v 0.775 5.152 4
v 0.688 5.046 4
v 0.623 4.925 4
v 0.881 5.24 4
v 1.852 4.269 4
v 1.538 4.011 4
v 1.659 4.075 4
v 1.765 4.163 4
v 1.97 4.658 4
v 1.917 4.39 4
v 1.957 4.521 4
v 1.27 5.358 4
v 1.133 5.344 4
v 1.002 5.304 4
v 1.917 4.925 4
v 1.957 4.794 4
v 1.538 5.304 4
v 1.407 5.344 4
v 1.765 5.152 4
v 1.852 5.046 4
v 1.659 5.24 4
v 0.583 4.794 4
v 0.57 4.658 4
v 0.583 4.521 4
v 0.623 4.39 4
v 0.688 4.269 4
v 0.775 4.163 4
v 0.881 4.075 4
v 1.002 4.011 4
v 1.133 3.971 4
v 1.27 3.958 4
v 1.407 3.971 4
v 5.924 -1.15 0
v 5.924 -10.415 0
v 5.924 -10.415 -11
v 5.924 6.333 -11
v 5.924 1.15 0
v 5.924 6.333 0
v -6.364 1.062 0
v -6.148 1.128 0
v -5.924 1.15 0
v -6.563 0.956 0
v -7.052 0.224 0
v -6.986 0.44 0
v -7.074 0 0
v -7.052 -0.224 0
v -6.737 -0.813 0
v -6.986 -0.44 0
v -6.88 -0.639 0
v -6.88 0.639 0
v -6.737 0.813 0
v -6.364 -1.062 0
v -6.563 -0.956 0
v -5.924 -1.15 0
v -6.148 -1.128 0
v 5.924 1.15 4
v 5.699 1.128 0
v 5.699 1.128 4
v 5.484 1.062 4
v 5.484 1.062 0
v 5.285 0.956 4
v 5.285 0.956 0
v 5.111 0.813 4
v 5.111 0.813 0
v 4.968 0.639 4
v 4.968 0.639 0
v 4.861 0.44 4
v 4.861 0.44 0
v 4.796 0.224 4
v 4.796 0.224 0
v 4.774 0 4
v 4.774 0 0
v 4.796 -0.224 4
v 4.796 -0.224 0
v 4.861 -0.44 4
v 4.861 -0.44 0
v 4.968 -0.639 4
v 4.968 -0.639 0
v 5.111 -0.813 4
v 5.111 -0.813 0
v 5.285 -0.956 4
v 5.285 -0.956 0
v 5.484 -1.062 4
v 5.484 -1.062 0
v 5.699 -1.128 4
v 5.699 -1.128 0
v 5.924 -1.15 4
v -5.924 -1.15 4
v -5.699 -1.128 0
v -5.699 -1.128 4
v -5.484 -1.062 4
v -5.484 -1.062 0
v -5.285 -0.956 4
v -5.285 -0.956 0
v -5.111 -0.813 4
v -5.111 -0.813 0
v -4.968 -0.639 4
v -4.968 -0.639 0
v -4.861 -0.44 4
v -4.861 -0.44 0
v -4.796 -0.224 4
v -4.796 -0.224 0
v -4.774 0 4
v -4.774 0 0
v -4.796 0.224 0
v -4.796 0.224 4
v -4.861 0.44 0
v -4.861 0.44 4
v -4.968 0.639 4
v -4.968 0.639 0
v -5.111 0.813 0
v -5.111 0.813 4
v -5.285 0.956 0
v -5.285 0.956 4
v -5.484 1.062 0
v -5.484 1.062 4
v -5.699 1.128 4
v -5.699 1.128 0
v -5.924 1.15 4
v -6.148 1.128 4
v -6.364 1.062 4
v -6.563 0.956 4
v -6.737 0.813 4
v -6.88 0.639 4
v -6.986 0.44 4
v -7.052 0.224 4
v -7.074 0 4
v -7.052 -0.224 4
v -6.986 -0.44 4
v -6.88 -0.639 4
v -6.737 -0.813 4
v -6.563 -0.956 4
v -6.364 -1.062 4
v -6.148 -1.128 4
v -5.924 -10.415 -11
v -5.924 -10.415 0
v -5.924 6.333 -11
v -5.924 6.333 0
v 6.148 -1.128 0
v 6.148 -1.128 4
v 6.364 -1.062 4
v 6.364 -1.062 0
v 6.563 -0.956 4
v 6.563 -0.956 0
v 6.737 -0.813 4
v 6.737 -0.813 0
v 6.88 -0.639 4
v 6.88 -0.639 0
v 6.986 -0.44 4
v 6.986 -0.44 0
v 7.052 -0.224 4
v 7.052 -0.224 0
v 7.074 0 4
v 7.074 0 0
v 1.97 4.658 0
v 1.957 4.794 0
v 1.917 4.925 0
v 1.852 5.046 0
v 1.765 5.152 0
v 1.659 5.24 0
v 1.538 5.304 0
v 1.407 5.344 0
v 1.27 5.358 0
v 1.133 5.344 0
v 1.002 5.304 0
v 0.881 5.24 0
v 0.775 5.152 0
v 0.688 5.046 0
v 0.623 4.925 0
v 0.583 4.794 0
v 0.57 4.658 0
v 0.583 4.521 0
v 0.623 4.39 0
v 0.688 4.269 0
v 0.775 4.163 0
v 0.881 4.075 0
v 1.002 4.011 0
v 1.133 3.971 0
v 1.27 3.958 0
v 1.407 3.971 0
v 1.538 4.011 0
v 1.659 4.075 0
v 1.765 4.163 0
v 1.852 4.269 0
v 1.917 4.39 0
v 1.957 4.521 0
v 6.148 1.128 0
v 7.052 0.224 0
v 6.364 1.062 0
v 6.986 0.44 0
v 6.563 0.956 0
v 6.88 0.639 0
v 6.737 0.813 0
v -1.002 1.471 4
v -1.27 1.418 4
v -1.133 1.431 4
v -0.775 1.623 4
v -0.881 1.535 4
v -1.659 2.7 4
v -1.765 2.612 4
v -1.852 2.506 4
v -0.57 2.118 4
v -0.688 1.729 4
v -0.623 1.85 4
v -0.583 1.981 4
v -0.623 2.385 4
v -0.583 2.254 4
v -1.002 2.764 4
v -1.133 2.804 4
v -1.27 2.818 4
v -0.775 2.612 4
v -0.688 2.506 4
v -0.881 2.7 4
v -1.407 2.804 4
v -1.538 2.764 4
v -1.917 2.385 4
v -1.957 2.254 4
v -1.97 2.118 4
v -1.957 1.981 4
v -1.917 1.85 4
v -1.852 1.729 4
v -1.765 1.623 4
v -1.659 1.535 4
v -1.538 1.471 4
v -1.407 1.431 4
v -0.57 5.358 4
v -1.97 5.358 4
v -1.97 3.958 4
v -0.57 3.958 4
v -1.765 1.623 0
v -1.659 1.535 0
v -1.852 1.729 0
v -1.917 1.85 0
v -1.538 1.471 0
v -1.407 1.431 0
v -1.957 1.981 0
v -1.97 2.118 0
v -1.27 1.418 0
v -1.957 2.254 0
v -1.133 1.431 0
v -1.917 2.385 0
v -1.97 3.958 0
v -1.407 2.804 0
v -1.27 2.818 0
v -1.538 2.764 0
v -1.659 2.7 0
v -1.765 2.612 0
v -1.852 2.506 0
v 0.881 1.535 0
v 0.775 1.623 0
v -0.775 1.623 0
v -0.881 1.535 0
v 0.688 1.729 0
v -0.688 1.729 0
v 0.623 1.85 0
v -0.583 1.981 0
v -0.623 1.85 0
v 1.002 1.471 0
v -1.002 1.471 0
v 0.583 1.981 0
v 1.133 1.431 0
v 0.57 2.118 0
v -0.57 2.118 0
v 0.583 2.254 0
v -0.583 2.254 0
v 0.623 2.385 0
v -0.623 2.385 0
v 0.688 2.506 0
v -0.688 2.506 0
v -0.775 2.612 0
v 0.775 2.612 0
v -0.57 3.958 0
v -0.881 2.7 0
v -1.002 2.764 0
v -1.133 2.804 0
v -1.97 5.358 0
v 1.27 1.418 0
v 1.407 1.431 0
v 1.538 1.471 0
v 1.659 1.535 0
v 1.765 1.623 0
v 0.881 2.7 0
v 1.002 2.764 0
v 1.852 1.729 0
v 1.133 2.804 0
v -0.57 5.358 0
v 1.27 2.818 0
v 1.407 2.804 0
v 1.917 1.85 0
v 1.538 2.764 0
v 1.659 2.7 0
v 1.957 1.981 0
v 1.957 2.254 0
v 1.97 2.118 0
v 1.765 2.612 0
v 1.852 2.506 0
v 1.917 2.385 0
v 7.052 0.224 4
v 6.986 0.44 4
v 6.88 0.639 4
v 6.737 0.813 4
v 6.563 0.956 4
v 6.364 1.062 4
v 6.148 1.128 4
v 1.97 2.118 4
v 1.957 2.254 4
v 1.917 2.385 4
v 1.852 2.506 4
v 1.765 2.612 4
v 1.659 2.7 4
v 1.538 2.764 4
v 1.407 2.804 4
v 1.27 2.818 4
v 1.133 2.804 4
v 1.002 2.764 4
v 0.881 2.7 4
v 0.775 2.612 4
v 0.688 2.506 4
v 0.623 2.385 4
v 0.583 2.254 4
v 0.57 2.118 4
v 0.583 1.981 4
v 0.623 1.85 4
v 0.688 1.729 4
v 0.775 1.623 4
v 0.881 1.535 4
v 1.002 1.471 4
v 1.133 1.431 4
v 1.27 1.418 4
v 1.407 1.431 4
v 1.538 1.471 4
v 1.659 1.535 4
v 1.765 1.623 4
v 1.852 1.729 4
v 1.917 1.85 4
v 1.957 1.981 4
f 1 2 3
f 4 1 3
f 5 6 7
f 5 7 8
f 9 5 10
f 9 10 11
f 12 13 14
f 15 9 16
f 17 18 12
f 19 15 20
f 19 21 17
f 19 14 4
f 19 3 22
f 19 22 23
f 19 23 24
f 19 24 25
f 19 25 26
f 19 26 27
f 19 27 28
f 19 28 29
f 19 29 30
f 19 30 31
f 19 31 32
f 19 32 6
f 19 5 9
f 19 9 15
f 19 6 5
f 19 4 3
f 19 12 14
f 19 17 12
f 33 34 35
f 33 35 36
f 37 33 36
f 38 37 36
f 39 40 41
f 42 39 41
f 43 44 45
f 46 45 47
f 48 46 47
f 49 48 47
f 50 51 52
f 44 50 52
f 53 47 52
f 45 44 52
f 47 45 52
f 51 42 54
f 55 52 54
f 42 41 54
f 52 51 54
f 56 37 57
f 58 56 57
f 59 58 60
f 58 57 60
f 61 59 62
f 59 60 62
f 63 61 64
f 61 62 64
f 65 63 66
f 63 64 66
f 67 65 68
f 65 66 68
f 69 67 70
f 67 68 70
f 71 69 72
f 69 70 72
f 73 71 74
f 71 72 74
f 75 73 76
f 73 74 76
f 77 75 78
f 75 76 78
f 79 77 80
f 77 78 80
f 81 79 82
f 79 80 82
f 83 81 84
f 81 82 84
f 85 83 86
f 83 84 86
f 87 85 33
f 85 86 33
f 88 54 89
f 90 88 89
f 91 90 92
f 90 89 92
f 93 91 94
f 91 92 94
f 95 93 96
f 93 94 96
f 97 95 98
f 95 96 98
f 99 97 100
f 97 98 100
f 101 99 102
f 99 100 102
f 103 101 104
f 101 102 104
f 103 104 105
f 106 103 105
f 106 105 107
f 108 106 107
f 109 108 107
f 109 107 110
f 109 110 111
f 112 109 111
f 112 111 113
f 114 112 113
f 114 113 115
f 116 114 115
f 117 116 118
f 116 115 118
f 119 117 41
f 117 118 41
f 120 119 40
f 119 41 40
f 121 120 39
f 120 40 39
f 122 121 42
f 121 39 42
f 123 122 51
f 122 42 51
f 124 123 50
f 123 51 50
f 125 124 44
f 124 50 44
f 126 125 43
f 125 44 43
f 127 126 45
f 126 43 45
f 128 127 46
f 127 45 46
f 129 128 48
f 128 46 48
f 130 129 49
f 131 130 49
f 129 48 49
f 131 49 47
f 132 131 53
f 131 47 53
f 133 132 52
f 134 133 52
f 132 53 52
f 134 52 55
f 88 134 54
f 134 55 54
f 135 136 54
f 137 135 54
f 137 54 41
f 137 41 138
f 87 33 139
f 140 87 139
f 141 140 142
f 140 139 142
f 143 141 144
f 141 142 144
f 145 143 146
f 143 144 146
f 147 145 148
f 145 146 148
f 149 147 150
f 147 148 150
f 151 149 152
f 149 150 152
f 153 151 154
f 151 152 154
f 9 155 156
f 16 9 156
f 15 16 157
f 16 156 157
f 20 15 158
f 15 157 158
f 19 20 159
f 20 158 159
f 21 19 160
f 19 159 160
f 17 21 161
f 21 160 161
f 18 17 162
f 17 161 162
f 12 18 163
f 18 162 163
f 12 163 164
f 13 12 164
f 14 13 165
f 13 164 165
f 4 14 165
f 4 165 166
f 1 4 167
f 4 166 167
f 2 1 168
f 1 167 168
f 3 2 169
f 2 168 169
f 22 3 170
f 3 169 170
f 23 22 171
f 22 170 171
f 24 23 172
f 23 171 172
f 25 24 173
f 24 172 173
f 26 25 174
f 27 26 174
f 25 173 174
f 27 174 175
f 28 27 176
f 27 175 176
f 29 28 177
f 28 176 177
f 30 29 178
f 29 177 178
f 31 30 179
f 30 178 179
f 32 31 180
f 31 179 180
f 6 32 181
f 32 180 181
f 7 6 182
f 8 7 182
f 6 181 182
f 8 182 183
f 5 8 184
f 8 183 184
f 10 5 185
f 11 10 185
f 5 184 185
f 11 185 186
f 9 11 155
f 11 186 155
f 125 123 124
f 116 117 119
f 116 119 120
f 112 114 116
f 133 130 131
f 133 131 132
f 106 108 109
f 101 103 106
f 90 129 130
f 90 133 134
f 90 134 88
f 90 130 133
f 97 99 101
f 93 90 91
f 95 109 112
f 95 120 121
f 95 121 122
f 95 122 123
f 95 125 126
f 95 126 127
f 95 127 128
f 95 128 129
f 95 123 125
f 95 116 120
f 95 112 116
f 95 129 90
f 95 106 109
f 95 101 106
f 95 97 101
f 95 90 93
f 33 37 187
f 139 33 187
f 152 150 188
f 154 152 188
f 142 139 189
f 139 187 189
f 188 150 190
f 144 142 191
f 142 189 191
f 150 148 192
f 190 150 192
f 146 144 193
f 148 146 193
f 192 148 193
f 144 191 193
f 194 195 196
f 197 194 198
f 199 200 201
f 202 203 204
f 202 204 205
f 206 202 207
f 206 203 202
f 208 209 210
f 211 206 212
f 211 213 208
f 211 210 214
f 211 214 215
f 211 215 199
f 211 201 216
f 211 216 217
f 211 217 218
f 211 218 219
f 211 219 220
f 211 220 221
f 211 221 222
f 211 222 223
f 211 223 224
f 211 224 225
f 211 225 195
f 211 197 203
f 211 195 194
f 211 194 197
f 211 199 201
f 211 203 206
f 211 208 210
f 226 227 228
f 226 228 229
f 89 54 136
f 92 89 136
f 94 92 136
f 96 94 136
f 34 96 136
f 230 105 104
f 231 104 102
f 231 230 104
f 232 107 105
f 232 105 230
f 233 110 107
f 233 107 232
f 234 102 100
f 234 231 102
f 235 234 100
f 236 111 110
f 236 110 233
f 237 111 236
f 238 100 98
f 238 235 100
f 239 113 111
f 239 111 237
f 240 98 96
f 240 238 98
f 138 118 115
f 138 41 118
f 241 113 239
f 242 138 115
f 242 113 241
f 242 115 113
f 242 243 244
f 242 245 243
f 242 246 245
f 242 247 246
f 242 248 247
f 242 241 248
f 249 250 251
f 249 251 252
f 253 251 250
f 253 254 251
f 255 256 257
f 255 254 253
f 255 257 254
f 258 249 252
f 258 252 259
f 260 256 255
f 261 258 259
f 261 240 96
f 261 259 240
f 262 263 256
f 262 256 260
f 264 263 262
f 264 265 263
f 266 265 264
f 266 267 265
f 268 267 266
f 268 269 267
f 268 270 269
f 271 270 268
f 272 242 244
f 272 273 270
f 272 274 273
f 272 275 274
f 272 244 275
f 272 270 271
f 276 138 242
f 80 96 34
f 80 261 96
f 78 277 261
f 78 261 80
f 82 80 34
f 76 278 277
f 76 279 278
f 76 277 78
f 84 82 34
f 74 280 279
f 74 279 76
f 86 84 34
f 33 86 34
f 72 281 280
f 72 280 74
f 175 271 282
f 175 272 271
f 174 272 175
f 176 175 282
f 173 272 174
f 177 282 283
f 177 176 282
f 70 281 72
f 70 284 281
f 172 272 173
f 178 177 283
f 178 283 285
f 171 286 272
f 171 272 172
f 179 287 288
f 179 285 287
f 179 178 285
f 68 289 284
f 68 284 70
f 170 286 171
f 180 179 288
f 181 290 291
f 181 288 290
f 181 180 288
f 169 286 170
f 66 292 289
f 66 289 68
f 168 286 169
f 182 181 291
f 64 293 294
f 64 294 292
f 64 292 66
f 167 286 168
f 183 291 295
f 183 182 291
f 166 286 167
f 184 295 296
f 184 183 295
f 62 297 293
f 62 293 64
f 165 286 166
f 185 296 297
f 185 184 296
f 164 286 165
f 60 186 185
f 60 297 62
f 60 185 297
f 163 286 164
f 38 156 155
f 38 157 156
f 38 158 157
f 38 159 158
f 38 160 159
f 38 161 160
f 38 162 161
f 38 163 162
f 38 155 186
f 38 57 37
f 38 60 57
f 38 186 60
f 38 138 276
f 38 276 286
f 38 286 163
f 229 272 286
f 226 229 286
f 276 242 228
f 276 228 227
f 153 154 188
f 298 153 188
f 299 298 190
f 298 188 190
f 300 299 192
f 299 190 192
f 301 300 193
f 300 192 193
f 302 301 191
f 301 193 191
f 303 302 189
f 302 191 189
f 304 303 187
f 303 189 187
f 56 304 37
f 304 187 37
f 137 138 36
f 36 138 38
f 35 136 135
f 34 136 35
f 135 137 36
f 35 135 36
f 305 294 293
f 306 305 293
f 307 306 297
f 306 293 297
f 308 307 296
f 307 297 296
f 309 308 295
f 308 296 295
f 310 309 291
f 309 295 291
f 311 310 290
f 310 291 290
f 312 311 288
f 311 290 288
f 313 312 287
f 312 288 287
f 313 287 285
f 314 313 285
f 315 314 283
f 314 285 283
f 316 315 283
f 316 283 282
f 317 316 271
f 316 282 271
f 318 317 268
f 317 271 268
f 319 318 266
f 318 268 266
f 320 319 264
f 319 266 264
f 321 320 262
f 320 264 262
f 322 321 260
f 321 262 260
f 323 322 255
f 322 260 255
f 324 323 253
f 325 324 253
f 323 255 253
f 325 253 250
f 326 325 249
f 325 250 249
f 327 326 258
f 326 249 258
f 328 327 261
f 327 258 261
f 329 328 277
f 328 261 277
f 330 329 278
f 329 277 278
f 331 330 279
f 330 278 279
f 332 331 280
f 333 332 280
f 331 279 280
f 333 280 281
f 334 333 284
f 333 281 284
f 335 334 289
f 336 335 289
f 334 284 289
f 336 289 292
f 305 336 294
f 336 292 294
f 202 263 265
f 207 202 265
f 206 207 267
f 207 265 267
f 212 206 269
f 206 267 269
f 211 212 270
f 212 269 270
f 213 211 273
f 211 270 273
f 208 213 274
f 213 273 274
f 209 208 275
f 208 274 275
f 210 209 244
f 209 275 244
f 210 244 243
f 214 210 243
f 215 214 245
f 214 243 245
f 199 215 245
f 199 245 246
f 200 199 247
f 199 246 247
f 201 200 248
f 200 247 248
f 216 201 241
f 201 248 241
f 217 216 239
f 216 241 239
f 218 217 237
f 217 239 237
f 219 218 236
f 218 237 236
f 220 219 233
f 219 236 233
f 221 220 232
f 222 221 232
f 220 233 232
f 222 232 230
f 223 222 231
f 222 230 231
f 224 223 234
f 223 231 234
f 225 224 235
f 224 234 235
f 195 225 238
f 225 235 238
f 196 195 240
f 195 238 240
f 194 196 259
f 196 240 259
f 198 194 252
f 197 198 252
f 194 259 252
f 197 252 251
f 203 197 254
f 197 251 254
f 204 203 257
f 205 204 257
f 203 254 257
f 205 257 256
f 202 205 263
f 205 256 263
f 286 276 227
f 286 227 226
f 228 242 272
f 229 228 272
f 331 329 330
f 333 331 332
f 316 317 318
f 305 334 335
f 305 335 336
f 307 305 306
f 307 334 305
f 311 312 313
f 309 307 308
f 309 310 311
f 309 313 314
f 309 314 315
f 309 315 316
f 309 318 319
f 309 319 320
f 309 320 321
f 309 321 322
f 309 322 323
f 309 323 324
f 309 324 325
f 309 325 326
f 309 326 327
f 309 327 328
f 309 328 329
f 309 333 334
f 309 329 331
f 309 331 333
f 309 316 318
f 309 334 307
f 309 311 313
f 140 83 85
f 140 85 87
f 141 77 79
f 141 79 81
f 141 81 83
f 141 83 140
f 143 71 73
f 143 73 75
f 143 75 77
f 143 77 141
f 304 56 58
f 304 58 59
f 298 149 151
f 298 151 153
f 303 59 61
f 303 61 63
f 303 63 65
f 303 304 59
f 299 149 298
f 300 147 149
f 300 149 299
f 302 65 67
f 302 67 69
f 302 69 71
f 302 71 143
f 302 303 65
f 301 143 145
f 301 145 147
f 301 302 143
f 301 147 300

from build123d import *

# Parameters (mm, degrees)
SKETCH1_W           = 11.84764794
SKETCH1_H           = 16.748729175
BOSS_EXTRUDE1_DEPTH = 11
SKETCH1_3_R         = 1.1500104
SKETCH1_3_W         = 1.3999972
SKETCH1_3_H         = 1.3999972
SKETCH1_3_R_2       = 0.6999986
BOSS_EXTRUDE2_DEPTH = 4


with BuildPart() as part:
    # Sketch1 → Boss-Extrude1 (new body)
    with BuildSketch(Plane.XY):
        with Locations((0, -2.040885412)):
            Rectangle(SKETCH1_W, SKETCH1_H)
    extrude(amount=-BOSS_EXTRUDE1_DEPTH)

    # Sketch1<3> → Boss-Extrude2 (add)
    with BuildSketch(Plane.XY):
        with Locations((5.92382397, 0)):
            Circle(SKETCH1_3_R)
        with Locations((-5.92382397, 0)):
            Circle(SKETCH1_3_R)
        with Locations((-1.27, 4.657515676)):
            Rectangle(SKETCH1_3_W, SKETCH1_3_H)
        with Locations((1.27, 4.657515676)):
            Circle(SKETCH1_3_R_2)
        with Locations((1.27, 2.117515676)):
            Circle(SKETCH1_3_R_2)
        with Locations((-1.27, 2.117515676)):
            Circle(SKETCH1_3_R_2)
    extrude(amount=BOSS_EXTRUDE2_DEPTH)


solid = part.part
